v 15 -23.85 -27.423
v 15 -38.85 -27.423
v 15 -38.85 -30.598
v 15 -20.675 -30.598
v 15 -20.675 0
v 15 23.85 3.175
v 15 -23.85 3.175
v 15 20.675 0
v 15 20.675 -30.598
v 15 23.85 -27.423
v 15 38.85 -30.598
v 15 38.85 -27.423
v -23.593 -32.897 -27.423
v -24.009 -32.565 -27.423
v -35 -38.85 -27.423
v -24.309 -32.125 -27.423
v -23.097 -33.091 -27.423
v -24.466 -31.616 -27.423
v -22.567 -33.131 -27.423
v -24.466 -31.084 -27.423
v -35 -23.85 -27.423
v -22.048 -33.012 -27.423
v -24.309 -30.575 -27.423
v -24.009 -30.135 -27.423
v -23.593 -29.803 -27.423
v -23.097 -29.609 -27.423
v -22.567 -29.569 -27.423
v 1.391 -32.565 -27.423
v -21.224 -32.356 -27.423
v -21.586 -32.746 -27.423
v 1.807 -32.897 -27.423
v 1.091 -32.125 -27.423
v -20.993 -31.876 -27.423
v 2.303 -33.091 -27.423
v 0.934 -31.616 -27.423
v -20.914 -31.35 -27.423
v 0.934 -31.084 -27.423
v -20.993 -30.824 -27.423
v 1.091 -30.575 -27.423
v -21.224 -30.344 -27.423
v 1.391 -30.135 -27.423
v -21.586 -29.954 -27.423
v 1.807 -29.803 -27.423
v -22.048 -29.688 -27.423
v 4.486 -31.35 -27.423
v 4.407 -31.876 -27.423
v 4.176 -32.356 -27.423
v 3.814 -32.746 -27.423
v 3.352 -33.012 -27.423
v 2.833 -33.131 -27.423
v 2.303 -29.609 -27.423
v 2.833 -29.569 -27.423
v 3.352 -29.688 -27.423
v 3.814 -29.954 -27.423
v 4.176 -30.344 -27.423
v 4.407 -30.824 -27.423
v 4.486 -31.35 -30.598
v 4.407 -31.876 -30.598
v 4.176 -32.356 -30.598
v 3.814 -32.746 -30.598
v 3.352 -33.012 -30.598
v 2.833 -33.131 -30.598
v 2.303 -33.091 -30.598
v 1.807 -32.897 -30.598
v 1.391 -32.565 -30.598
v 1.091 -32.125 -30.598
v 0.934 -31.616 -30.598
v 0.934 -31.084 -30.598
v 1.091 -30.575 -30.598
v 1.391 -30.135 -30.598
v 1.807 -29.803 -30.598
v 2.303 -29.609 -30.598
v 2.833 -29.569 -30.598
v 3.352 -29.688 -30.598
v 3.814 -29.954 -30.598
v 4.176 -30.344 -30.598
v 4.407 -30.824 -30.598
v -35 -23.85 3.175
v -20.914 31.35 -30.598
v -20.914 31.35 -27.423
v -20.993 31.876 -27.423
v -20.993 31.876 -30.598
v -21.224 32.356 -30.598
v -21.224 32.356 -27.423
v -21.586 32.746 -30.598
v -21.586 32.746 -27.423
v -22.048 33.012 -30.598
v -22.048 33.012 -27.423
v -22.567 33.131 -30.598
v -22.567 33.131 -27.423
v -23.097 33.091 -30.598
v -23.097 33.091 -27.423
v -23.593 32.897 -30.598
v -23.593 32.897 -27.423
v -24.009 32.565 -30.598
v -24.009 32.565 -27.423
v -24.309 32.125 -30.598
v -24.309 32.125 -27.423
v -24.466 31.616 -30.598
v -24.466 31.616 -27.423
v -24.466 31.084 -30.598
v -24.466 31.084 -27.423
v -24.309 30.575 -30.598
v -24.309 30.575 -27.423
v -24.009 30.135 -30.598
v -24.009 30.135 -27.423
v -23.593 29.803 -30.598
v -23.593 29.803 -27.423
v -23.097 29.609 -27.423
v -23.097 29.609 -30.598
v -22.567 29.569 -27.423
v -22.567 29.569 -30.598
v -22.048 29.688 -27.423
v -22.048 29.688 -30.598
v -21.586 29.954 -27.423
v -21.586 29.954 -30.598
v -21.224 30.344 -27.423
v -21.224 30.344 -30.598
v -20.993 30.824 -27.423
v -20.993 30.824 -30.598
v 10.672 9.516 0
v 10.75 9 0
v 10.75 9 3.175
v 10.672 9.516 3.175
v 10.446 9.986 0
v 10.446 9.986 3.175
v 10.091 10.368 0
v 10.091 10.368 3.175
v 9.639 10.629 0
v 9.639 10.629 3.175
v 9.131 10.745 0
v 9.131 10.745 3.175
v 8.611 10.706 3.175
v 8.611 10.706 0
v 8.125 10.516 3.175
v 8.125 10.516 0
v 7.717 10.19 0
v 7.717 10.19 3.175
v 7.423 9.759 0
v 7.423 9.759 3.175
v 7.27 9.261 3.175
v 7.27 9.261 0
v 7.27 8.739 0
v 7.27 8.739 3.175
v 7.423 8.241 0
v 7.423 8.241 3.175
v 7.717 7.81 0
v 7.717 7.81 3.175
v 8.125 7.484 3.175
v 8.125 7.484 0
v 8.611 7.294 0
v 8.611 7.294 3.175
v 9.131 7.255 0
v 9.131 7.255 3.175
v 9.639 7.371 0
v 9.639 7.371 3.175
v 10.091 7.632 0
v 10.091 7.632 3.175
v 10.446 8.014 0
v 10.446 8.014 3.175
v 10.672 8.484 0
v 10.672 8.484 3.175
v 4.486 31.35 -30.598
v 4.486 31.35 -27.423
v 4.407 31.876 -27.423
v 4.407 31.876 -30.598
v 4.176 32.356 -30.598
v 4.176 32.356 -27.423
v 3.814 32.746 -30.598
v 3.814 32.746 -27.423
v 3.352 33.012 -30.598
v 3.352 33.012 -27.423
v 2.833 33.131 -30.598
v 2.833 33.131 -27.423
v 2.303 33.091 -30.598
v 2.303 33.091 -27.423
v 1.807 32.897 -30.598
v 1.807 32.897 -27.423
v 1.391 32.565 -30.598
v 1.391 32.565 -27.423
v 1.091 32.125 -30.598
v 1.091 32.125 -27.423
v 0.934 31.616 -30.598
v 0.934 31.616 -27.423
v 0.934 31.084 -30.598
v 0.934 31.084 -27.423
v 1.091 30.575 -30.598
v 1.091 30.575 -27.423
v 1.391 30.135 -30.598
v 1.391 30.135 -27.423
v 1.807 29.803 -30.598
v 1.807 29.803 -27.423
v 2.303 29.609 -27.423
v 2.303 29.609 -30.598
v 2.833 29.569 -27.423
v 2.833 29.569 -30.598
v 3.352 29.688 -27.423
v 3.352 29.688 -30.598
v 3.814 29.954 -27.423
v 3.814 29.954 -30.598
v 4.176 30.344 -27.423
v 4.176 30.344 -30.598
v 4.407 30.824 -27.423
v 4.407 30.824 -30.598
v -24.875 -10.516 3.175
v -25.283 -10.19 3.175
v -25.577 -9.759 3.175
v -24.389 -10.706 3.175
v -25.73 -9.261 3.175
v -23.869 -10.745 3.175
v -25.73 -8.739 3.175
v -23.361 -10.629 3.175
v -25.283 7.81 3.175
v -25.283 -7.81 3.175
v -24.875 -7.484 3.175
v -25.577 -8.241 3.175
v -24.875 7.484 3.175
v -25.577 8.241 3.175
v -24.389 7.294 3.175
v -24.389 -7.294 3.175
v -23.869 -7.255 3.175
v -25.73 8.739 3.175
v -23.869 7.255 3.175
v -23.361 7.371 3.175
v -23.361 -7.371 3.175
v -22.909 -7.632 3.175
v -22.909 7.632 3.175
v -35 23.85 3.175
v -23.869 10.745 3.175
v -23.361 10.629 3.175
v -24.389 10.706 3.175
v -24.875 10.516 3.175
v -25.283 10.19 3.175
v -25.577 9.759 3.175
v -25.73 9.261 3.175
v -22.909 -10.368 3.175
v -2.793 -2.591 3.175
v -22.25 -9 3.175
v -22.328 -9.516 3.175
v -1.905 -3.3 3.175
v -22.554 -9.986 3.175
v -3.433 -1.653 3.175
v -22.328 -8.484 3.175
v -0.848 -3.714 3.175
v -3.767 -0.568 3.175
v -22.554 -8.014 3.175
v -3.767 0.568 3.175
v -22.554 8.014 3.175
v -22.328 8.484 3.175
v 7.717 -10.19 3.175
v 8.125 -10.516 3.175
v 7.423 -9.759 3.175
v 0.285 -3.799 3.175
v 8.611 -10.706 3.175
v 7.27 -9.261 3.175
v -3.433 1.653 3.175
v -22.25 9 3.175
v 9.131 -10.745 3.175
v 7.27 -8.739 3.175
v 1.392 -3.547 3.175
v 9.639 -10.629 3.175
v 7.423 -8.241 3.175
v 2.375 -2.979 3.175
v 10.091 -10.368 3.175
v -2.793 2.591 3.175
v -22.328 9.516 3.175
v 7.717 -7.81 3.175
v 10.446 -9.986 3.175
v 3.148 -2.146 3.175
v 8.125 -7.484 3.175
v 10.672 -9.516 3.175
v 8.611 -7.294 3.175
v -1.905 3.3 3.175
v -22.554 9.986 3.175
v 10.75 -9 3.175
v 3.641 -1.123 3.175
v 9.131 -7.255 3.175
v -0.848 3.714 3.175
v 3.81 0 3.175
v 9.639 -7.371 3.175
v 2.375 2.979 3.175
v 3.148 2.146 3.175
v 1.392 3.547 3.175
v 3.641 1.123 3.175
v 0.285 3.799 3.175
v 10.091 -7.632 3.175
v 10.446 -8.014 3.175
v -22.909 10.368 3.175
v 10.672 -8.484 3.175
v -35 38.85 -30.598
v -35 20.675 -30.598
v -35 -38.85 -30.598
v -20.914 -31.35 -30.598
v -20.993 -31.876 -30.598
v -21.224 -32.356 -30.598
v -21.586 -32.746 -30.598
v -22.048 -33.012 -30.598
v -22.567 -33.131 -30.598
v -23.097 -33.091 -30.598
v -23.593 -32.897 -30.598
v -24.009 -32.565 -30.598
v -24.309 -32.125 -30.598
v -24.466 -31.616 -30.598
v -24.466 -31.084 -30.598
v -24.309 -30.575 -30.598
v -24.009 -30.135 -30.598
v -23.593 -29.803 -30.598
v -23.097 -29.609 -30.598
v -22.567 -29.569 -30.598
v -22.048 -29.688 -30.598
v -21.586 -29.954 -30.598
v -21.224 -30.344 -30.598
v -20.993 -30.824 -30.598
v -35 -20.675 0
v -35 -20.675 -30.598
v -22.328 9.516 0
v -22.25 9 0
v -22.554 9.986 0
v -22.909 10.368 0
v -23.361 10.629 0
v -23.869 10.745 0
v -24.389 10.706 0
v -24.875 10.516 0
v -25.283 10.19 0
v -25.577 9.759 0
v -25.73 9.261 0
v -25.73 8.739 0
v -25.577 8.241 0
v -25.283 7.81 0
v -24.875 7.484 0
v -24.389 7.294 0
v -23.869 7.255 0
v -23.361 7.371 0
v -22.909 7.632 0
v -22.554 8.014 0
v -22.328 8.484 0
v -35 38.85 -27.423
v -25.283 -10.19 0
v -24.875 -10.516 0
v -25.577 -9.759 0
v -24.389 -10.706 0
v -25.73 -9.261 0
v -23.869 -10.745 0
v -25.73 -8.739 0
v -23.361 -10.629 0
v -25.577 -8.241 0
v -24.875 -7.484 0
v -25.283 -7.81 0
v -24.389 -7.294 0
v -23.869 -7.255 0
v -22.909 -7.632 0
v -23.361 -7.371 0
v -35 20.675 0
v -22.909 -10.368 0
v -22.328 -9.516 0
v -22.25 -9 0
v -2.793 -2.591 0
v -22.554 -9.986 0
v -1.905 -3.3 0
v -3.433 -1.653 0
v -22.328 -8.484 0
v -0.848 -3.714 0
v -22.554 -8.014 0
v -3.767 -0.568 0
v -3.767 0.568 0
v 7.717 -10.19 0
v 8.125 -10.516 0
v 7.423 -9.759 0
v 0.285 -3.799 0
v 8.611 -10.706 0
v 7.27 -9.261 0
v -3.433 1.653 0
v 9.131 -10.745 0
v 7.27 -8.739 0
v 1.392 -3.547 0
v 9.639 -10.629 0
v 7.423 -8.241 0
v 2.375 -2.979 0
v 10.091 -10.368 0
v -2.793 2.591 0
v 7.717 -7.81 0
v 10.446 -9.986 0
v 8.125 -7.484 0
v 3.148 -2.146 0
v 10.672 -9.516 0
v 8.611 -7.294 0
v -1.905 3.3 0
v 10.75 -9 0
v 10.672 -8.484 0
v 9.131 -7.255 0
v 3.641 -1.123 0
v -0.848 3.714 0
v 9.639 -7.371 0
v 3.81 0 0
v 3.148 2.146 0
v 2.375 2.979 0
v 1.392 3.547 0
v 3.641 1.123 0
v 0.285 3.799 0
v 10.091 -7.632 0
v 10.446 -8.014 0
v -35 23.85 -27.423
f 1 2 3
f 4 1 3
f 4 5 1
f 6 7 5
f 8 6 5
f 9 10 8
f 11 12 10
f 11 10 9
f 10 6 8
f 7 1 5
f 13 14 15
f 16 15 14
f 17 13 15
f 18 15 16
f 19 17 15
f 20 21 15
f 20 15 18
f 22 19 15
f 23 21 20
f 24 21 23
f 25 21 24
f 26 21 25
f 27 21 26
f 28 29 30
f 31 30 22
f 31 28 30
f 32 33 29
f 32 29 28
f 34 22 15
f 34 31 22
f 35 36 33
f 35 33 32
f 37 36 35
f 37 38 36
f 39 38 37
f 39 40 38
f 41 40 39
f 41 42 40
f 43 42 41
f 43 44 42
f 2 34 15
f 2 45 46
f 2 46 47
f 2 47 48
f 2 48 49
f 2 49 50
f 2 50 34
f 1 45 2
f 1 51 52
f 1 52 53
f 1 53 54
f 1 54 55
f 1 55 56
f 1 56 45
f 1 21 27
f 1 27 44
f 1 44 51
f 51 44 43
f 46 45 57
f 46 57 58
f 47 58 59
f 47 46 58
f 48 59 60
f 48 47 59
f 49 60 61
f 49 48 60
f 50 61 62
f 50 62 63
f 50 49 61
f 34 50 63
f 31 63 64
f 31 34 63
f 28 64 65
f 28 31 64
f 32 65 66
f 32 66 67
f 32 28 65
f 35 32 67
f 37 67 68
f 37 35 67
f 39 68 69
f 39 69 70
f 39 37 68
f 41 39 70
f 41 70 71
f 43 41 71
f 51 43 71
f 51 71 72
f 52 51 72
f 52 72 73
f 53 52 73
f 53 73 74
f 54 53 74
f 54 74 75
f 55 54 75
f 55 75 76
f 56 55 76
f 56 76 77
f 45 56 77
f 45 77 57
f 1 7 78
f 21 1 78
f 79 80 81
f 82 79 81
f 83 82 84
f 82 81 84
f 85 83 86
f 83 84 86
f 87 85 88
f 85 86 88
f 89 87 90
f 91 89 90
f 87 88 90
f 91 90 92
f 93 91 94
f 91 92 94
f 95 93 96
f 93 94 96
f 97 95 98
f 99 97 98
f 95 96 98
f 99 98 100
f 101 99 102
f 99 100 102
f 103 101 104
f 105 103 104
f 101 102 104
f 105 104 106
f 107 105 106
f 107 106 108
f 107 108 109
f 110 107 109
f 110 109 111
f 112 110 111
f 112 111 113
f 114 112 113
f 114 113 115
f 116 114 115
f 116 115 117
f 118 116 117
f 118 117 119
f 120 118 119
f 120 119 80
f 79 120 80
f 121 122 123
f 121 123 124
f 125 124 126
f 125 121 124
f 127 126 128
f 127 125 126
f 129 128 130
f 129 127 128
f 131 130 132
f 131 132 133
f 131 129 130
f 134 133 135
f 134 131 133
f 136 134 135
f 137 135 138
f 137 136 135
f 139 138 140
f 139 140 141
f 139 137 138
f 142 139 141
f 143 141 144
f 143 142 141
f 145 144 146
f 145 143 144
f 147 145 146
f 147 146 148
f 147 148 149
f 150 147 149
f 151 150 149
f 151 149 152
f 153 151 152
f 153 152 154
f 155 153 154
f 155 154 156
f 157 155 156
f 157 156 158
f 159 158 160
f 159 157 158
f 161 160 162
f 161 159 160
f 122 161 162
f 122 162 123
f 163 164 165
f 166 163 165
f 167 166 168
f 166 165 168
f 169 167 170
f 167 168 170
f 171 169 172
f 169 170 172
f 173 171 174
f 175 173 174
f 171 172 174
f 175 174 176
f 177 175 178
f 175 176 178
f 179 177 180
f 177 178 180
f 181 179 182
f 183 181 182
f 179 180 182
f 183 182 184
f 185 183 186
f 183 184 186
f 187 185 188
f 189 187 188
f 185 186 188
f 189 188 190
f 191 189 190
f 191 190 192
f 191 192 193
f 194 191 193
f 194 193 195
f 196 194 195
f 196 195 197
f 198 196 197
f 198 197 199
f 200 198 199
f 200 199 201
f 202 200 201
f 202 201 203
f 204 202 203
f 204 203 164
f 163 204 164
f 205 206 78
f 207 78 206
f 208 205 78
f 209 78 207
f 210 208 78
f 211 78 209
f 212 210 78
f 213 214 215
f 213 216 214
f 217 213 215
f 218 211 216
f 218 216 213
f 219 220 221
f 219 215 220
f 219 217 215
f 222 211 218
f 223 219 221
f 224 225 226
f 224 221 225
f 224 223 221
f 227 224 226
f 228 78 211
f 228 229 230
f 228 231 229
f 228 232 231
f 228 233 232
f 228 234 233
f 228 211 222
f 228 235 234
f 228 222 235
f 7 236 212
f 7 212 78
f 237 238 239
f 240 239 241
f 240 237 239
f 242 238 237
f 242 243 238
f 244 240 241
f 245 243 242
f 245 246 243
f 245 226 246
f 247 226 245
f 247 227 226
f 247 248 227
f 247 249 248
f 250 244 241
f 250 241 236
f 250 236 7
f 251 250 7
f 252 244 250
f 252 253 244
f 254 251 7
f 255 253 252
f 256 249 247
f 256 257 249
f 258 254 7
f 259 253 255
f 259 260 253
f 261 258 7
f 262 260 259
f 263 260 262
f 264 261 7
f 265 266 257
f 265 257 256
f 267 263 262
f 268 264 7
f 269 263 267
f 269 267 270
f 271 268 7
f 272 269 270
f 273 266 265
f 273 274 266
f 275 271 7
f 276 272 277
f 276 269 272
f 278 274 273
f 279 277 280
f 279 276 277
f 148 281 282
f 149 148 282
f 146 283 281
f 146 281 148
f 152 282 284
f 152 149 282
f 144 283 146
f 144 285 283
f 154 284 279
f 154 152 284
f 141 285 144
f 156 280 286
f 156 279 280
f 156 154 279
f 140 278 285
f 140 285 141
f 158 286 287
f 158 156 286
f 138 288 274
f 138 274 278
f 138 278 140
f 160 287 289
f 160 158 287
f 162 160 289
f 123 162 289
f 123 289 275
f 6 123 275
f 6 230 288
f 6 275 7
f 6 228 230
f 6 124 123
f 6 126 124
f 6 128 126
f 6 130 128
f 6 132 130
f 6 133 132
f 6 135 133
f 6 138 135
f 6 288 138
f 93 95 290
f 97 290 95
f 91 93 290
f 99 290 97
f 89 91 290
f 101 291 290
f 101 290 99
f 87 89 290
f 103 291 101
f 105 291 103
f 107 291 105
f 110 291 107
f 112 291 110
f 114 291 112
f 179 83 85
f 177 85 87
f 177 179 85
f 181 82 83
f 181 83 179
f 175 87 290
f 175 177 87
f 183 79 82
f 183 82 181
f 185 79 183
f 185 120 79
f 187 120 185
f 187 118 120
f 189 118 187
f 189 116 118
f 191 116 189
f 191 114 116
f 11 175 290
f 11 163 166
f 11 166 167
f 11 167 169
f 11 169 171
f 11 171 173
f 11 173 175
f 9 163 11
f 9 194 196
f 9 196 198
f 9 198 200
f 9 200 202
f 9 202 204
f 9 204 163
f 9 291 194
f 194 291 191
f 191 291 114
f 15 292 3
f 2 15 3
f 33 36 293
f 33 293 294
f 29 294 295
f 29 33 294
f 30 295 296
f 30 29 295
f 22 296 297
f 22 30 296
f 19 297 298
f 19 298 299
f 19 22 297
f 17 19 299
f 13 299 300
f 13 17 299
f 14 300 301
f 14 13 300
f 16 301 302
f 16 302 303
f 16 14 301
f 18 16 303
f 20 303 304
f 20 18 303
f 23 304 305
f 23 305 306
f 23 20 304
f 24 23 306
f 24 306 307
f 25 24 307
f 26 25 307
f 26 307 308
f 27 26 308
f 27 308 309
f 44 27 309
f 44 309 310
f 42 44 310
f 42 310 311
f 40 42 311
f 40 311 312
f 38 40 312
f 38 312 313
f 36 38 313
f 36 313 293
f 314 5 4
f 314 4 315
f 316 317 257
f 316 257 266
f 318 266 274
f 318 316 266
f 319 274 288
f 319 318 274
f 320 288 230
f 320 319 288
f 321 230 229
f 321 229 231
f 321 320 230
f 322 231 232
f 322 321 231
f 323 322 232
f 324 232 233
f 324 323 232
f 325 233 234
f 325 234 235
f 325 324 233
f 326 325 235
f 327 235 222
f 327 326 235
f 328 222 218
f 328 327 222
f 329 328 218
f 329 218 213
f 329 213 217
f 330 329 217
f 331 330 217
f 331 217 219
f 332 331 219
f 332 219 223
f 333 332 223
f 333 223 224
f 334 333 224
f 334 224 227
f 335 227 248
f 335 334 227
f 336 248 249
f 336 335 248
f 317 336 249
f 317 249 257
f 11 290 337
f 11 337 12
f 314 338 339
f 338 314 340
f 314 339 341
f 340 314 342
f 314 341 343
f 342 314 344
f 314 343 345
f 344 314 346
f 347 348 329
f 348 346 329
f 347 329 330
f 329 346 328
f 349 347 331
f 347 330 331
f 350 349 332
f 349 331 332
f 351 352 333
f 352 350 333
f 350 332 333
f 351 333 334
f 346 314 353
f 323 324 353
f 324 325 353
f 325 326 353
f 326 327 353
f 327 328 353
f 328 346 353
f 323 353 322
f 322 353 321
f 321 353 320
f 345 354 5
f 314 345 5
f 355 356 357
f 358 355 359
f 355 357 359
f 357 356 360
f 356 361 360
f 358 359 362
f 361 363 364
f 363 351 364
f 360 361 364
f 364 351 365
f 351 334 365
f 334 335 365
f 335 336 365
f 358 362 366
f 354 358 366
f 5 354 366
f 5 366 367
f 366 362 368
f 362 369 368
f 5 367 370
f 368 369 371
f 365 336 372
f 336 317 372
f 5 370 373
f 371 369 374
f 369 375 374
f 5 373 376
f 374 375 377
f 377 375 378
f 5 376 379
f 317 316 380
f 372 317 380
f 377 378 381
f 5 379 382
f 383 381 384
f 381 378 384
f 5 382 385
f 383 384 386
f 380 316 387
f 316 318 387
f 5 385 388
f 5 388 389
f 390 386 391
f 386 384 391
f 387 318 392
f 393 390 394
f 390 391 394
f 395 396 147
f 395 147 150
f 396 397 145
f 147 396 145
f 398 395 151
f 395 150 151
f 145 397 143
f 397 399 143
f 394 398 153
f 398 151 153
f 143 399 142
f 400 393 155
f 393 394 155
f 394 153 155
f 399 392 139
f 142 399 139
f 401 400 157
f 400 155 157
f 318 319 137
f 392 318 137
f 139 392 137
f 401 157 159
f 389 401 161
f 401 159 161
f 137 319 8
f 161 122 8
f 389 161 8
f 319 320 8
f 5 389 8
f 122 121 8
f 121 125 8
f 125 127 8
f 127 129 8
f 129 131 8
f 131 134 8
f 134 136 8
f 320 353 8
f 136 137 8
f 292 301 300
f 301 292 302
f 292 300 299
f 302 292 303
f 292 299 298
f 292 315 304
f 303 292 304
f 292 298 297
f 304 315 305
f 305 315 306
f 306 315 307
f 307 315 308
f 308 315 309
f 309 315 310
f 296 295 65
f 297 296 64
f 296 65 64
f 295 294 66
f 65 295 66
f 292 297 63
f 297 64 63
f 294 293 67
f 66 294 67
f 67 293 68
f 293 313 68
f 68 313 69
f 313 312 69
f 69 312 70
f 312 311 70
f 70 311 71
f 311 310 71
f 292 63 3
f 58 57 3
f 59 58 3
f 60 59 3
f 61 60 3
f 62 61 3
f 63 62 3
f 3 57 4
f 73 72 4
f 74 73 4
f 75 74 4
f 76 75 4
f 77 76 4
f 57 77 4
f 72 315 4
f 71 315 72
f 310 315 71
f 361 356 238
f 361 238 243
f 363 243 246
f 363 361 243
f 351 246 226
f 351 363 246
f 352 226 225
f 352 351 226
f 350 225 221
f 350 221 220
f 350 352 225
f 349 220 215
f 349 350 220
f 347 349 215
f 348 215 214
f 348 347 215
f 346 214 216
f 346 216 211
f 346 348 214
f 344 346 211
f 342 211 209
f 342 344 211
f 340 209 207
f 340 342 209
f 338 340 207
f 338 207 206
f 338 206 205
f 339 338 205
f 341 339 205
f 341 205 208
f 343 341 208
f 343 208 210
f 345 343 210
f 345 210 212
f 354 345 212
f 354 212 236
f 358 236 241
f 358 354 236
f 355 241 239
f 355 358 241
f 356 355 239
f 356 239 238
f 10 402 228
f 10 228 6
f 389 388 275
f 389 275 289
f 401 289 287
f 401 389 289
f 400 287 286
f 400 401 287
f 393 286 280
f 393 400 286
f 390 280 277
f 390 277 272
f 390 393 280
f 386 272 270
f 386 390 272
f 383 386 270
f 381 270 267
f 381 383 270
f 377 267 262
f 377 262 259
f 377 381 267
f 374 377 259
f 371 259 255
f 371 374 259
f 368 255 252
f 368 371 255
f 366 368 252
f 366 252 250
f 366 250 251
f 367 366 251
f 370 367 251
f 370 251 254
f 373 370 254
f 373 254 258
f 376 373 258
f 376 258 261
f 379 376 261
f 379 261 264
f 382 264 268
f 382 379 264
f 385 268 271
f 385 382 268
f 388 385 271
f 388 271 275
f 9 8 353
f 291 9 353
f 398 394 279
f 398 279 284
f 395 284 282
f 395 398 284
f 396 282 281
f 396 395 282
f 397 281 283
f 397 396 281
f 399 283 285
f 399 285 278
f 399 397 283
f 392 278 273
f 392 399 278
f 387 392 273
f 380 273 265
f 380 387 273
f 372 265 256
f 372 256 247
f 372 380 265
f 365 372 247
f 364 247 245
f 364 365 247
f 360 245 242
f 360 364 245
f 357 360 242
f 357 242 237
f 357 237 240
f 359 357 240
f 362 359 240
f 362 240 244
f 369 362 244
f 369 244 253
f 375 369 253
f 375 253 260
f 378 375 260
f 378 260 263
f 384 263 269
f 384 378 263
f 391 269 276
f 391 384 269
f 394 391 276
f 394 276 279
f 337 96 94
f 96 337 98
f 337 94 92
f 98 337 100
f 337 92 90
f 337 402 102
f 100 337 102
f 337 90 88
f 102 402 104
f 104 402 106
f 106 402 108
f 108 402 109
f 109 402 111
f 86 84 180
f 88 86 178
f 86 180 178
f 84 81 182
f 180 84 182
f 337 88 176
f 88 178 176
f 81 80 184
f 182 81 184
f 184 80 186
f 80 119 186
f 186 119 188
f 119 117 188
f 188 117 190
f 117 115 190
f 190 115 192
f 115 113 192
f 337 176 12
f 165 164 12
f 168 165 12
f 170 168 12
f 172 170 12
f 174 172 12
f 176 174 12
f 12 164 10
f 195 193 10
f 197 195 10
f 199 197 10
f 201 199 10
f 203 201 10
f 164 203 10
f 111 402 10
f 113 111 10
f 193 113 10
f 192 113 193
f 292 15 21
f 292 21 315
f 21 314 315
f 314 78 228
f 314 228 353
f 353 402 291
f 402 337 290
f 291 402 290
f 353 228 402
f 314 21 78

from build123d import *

# Parameters (mm, degrees)
SKETCH1_W           = 50
SKETCH1_H           = 47.7
SKETCH1_R           = 1.75
SKETCH1_R_2         = 3.81
BOSS_EXTRUDE1_DEPTH = 3.175
SKETCH2_W           = 50
SKETCH2_H           = 3.175
BOSS_EXTRUDE2_DEPTH = 30.5976
SKETCH3_W           = 50
SKETCH3_H           = 3.175
BOSS_EXTRUDE3_DEPTH = 15
CUT_EXTRUDE1_REACH  = 62.585
SKETCH4_R           = 1.7859375


with BuildPart() as part:
    # Sketch1 → Boss-Extrude1 (new body)
    with BuildSketch(Plane.XY):
        with Locations((-10, 0)):
            Rectangle(SKETCH1_W, SKETCH1_H)
        with Locations((-24, 9)):
            Circle(SKETCH1_R, mode=Mode.SUBTRACT)
        with Locations((-24, -9)):
            Circle(SKETCH1_R, mode=Mode.SUBTRACT)
        with Locations((9, -9)):
            Circle(SKETCH1_R, mode=Mode.SUBTRACT)
        with Locations((9, 9)):
            Circle(SKETCH1_R, mode=Mode.SUBTRACT)
        Circle(SKETCH1_R_2, mode=Mode.SUBTRACT)
    extrude(amount=BOSS_EXTRUDE1_DEPTH)

    # Sketch2 → Boss-Extrude2 (add)
    with BuildSketch(Plane(origin=(0, 0, 0), x_dir=(-1, 0, 0), z_dir=(0, 0, -1))):
        with Locations((10, -22.2625)):
            Rectangle(SKETCH2_W, SKETCH2_H)
        with Locations((10, 22.2625)):
            Rectangle(SKETCH2_W, SKETCH2_H)
    extrude(amount=BOSS_EXTRUDE2_DEPTH)

    # Sketch3 → Boss-Extrude3 (add)
    with BuildSketch(Plane(origin=(0, 23.85, 0), x_dir=(1, 0, 0), z_dir=(0, 1, 0))):
        with Locations((-10, 29.0101)):
            Rectangle(SKETCH3_W, SKETCH3_H)
    boss_extrude3 = extrude(amount=BOSS_EXTRUDE3_DEPTH)

    # Sketch4 → Cut-Extrude1 (cut, up to next)
    with BuildSketch(Plane.XY.offset(-27.4226), mode=Mode.PRIVATE) as cut_extrude1_sk1:
        with Locations((2.7, 31.35)):
            Circle(SKETCH4_R)
    cut_extrude1_tool1 = extrude(cut_extrude1_sk1.sketch, amount=-CUT_EXTRUDE1_REACH, mode=Mode.PRIVATE) & part.part
    # Sketch4 → Cut-Extrude1 (cut, up to next)
    with BuildSketch(Plane.XY.offset(-27.4226), mode=Mode.PRIVATE) as cut_extrude1_sk2:
        with Locations((-22.7, 31.35)):
            Circle(SKETCH4_R)
    cut_extrude1_tool2 = extrude(cut_extrude1_sk2.sketch, amount=-CUT_EXTRUDE1_REACH, mode=Mode.PRIVATE) & part.part
    cut_extrude1_1 = cut_extrude1_tool1.solids().sort_by_distance((2.7, 31.35, -27.4226))[0]
    add(cut_extrude1_1, mode=Mode.SUBTRACT)
    cut_extrude1_2 = cut_extrude1_tool2.solids().sort_by_distance((-22.7, 31.35, -27.4226))[0]
    add(cut_extrude1_2, mode=Mode.SUBTRACT)
    cut_extrude1 = cut_extrude1_1 + cut_extrude1_2  # Cut-Extrude1 as one shape, for the pattern or mirror that repeats it

    # Mirror1: Boss-Extrude3, Cut-Extrude1 across plane
    add(boss_extrude3.mirror(Plane.ZX))
    add(cut_extrude1.mirror(Plane.ZX), mode=Mode.SUBTRACT)


solid = part.part
